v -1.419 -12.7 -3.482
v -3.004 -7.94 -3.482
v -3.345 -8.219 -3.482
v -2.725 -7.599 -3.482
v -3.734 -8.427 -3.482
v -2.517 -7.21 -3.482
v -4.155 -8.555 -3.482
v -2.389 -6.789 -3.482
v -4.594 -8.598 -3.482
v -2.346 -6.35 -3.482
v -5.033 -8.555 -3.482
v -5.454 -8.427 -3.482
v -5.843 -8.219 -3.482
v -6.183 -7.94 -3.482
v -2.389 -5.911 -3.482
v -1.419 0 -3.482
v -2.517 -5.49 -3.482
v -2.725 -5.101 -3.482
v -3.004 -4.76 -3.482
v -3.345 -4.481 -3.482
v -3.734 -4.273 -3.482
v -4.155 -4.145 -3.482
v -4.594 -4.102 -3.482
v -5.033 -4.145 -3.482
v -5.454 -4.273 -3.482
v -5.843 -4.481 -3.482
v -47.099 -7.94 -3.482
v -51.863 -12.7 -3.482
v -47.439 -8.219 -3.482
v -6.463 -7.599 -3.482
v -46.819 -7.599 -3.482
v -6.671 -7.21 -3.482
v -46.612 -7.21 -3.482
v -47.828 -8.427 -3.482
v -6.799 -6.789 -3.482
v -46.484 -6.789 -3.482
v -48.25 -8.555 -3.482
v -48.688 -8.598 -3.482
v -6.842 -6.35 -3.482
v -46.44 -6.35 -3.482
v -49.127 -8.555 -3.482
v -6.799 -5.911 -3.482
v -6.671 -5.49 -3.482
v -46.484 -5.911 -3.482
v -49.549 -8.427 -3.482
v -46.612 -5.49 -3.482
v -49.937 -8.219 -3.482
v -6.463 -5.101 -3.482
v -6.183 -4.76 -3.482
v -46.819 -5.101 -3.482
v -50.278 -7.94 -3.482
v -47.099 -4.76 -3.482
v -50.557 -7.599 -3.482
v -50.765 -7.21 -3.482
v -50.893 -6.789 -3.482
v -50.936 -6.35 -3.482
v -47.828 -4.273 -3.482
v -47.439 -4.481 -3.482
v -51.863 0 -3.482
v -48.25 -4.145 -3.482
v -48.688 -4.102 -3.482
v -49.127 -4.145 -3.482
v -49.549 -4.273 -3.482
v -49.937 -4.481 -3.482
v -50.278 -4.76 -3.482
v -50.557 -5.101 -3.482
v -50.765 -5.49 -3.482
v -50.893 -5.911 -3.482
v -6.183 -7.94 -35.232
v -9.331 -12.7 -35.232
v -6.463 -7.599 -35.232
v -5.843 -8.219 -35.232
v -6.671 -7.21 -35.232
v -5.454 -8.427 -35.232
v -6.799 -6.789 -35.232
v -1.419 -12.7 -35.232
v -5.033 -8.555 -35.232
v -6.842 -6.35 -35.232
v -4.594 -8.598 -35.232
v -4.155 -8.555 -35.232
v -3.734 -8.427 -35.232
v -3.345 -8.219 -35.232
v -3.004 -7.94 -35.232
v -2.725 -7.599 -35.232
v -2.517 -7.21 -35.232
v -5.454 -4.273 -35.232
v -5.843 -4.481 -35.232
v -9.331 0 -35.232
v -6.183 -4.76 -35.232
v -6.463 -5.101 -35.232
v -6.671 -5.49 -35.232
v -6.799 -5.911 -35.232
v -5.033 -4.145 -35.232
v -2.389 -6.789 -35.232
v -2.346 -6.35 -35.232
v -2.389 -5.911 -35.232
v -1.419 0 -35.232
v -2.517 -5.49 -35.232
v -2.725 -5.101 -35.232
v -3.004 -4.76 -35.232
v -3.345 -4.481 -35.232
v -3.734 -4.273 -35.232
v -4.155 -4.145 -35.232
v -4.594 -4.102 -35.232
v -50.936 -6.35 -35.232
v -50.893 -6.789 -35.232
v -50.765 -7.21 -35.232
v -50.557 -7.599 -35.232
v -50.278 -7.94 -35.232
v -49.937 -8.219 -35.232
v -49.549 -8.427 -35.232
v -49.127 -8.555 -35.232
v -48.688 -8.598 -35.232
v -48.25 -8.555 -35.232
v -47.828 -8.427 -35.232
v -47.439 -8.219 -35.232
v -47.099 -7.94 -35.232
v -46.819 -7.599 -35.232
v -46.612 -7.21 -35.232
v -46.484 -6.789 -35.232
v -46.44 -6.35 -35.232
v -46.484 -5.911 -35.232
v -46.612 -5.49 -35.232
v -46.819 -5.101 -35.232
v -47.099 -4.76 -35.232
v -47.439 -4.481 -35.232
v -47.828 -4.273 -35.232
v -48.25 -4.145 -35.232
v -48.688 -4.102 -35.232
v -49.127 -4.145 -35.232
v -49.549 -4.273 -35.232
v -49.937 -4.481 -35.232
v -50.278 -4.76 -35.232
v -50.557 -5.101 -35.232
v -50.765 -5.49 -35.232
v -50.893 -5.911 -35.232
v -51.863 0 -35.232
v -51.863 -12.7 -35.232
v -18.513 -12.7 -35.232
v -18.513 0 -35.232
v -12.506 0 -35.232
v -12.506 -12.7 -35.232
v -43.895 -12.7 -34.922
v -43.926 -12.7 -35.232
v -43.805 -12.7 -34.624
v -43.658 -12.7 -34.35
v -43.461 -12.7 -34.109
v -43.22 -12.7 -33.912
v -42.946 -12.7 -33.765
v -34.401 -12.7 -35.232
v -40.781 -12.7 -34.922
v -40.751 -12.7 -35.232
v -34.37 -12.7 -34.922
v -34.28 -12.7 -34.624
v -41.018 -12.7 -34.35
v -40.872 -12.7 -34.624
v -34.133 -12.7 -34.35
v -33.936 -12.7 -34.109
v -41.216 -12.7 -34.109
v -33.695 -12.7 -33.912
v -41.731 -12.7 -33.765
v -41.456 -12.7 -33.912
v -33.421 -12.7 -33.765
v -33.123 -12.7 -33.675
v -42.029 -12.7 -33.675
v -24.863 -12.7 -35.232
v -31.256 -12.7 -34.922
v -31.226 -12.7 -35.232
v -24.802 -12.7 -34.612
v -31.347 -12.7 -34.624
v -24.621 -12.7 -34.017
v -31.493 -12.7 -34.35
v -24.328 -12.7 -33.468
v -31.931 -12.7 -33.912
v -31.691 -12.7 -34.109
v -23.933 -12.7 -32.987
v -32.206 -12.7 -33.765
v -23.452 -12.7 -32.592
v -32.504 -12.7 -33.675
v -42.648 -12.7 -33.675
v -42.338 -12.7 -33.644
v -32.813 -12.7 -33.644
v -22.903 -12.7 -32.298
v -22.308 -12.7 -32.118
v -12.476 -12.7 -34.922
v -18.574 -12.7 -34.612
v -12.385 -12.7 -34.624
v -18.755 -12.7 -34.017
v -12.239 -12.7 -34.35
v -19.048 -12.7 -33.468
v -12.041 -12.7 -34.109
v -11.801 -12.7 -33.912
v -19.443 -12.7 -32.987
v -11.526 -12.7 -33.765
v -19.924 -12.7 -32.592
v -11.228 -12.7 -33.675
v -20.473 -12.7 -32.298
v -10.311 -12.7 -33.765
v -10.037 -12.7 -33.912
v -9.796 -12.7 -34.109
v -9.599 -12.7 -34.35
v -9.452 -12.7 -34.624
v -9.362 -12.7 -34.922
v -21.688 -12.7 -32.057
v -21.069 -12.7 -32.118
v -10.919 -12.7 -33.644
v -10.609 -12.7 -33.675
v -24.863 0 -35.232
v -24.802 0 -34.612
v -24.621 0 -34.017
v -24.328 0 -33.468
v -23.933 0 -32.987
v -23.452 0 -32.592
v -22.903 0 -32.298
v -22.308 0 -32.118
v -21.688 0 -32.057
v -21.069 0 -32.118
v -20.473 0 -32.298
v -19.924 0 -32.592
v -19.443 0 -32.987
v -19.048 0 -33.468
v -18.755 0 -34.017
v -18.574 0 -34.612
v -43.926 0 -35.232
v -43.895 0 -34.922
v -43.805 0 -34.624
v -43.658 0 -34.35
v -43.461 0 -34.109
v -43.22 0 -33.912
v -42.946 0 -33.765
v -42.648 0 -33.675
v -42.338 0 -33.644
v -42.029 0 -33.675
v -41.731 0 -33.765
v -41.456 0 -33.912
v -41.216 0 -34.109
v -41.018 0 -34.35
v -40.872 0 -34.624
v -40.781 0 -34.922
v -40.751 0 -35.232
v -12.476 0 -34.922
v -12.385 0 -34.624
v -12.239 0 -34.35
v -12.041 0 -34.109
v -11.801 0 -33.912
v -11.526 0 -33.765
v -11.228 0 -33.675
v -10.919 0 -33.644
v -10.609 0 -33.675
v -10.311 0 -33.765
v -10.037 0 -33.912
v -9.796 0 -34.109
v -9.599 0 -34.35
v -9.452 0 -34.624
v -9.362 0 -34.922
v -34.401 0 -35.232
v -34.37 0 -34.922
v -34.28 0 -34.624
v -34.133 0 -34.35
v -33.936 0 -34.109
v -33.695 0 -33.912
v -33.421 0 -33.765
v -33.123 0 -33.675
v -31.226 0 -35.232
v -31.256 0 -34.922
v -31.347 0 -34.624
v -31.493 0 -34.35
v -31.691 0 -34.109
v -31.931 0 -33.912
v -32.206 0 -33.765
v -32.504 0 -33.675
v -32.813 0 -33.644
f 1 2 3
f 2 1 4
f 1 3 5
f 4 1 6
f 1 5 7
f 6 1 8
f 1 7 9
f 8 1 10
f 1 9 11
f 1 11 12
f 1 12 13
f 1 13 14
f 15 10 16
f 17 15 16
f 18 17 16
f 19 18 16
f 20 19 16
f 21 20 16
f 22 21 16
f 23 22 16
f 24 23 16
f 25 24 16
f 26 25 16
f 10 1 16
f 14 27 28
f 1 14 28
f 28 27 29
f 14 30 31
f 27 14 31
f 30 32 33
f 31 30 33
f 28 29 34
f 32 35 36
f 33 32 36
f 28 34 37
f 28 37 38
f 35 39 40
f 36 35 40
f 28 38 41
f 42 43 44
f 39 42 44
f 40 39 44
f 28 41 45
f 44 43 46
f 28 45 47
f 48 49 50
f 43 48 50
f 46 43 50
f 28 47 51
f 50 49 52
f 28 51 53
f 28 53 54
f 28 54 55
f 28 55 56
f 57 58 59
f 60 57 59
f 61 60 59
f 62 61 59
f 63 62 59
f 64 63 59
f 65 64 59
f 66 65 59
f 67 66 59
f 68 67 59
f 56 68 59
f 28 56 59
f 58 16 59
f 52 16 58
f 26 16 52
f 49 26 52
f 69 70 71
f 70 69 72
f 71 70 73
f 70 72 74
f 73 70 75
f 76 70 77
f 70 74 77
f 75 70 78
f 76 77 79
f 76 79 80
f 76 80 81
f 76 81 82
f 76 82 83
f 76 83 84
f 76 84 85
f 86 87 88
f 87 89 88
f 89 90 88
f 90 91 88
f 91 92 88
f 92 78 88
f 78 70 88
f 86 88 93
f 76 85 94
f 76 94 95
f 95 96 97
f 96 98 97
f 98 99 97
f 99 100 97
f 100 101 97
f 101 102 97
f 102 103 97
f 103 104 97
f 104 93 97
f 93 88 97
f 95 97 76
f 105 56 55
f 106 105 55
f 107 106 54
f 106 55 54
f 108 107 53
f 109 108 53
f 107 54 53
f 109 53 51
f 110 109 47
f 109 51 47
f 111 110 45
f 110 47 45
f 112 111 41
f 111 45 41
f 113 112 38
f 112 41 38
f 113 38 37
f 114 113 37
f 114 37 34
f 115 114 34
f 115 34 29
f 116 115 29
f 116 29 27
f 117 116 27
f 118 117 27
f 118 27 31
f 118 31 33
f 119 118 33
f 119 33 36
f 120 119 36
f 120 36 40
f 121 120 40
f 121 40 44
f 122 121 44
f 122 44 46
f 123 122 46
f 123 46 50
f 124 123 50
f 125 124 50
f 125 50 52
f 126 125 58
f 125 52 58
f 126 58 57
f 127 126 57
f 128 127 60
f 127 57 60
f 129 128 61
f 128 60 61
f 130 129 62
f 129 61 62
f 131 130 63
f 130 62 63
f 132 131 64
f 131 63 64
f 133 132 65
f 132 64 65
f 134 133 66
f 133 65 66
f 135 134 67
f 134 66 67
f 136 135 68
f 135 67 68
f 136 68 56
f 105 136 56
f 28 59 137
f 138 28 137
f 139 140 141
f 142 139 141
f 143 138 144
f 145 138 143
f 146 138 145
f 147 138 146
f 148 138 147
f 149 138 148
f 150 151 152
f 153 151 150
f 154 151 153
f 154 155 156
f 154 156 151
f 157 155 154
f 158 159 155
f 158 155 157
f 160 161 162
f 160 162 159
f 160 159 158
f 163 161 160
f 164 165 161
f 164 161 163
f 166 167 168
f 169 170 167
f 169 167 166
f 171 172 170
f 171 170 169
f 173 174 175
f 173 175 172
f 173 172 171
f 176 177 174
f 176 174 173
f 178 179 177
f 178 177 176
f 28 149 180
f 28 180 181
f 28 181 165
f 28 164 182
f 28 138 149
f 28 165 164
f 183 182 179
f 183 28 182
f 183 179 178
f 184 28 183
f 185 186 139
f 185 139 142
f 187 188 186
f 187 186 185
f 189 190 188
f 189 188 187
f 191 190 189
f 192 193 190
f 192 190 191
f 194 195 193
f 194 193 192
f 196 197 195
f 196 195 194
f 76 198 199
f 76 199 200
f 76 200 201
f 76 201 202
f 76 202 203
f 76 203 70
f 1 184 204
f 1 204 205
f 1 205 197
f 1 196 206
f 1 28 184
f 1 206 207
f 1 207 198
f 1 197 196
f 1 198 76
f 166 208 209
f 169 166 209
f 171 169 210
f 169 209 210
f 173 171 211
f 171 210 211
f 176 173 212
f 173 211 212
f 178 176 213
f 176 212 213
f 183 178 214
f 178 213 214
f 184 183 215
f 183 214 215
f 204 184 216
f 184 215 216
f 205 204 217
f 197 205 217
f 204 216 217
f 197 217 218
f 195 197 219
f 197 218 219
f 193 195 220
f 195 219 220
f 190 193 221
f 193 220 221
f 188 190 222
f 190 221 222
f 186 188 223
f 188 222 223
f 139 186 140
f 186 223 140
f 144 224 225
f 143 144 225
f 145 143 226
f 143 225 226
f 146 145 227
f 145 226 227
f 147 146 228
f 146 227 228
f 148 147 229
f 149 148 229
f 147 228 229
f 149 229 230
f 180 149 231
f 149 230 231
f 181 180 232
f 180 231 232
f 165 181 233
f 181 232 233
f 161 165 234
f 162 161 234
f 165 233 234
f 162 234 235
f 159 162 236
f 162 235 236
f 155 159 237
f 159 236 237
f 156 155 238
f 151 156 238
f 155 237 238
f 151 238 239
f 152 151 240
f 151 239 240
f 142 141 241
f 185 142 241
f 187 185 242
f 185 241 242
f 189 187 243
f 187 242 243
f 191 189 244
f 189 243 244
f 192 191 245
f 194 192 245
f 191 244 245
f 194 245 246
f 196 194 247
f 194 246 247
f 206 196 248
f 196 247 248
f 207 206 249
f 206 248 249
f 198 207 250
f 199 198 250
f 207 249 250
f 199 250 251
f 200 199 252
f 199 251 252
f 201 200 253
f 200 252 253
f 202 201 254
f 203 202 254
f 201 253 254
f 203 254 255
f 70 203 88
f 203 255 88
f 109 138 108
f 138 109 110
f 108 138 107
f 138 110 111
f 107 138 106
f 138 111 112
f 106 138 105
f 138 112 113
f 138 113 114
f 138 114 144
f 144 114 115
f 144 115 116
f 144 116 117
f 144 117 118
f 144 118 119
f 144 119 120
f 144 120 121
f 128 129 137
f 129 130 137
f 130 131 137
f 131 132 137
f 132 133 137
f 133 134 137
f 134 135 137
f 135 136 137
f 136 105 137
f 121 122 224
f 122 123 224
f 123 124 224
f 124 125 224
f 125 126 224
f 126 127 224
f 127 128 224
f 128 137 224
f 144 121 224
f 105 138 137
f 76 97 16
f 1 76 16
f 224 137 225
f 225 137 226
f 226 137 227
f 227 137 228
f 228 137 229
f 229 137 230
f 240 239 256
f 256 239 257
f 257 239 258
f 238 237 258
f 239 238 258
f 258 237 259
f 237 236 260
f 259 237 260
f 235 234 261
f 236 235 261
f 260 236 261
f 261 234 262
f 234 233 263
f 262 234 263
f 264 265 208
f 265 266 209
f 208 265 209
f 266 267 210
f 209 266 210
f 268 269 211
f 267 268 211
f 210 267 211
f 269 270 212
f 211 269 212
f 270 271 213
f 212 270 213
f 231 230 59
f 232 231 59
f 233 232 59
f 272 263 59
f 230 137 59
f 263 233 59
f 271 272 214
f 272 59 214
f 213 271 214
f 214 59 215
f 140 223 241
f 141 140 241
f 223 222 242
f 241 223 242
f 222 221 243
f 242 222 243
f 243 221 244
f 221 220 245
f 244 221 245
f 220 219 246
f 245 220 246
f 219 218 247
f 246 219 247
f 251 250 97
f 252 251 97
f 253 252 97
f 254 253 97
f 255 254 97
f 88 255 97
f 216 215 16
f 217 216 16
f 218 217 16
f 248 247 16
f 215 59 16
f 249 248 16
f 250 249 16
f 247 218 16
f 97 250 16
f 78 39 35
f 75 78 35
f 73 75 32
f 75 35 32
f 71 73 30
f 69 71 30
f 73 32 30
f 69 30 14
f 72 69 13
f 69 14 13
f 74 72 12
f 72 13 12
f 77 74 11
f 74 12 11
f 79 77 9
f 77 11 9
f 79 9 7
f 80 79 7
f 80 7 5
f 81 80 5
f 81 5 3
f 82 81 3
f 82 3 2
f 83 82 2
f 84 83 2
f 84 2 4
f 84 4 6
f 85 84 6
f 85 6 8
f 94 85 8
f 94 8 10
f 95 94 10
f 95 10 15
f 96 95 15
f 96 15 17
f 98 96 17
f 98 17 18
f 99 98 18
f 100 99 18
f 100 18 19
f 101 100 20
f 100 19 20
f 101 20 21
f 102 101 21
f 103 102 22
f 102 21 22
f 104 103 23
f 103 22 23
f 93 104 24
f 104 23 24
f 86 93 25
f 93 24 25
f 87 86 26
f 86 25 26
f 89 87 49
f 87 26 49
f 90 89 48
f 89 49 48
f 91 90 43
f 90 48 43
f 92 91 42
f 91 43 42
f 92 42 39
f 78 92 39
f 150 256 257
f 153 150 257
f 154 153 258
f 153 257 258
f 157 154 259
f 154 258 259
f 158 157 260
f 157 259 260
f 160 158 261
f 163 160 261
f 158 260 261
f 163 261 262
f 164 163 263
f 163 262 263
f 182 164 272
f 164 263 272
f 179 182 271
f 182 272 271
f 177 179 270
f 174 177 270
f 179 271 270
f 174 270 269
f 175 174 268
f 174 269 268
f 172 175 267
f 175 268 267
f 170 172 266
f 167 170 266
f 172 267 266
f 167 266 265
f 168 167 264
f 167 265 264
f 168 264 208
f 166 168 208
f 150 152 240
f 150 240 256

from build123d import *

# Parameters (mm, degrees)
F1_DEPTH   = 12.7
F4_D       = 4.4958
F4_ON_F3_D = 4.4958


with BuildPart() as f1:
    # F0 (on Front) → F1 (new body)
    with BuildSketch(Plane.XZ):
        with BuildLine():
            Line((-51.8633585078, -3.48165389), (-51.8633585078, -35.23165389))
            Line((-51.8633585078, -35.23165389), (-43.9258585078, -35.23165389))
            ThreePointArc((-43.9258585078, -35.23165389), (-42.3383585078, -33.64415389), (-40.7508585078, -35.23165389))
            Line((-40.7508585078, -35.23165389), (-34.4008585078, -35.23165389))
            ThreePointArc((-34.4008585078, -35.23165389), (-32.8133585078, -33.64415389), (-31.2258585078, -35.23165389))
            Line((-31.2258585078, -35.23165389), (-24.8631585078, -35.23165389))
            ThreePointArc((-24.8631585078, -35.23165389), (-21.6881585078, -32.05665389), (-18.5131585078, -35.23165389))
            Line((-18.5131585078, -35.23165389), (-12.5060585078, -35.23165389))
            ThreePointArc((-12.5060585078, -35.23165389), (-10.9185585078, -33.64415389), (-9.3310585078, -35.23165389))
            Line((-9.3310585078, -35.23165389), (-1.4189585078, -35.23165389))
            Line((-1.4189585078, -35.23165389), (-1.4189585078, -3.48165389))
            Line((-1.4189585078, -3.48165389), (-51.8633585078, -3.48165389))
        make_face()
    extrude(amount=F1_DEPTH)

    # F4 (through all)
    with Locations(Plane(origin=(0, 0, -35.23165389), x_dir=(1, 0, 0), z_dir=(0, 0, -1))):
        with Locations((-48.6883585078, 6.35)):
            Hole(F4_D / 2)

    # F4 on F3 (through all)
    with Locations(Plane(origin=(0, 0, -35.23165389), x_dir=(1, 0, 0), z_dir=(0, 0, -1))):
        with Locations((-4.5939585078, 6.35)):
            Hole(F4_ON_F3_D / 2)


solid = f1.part
